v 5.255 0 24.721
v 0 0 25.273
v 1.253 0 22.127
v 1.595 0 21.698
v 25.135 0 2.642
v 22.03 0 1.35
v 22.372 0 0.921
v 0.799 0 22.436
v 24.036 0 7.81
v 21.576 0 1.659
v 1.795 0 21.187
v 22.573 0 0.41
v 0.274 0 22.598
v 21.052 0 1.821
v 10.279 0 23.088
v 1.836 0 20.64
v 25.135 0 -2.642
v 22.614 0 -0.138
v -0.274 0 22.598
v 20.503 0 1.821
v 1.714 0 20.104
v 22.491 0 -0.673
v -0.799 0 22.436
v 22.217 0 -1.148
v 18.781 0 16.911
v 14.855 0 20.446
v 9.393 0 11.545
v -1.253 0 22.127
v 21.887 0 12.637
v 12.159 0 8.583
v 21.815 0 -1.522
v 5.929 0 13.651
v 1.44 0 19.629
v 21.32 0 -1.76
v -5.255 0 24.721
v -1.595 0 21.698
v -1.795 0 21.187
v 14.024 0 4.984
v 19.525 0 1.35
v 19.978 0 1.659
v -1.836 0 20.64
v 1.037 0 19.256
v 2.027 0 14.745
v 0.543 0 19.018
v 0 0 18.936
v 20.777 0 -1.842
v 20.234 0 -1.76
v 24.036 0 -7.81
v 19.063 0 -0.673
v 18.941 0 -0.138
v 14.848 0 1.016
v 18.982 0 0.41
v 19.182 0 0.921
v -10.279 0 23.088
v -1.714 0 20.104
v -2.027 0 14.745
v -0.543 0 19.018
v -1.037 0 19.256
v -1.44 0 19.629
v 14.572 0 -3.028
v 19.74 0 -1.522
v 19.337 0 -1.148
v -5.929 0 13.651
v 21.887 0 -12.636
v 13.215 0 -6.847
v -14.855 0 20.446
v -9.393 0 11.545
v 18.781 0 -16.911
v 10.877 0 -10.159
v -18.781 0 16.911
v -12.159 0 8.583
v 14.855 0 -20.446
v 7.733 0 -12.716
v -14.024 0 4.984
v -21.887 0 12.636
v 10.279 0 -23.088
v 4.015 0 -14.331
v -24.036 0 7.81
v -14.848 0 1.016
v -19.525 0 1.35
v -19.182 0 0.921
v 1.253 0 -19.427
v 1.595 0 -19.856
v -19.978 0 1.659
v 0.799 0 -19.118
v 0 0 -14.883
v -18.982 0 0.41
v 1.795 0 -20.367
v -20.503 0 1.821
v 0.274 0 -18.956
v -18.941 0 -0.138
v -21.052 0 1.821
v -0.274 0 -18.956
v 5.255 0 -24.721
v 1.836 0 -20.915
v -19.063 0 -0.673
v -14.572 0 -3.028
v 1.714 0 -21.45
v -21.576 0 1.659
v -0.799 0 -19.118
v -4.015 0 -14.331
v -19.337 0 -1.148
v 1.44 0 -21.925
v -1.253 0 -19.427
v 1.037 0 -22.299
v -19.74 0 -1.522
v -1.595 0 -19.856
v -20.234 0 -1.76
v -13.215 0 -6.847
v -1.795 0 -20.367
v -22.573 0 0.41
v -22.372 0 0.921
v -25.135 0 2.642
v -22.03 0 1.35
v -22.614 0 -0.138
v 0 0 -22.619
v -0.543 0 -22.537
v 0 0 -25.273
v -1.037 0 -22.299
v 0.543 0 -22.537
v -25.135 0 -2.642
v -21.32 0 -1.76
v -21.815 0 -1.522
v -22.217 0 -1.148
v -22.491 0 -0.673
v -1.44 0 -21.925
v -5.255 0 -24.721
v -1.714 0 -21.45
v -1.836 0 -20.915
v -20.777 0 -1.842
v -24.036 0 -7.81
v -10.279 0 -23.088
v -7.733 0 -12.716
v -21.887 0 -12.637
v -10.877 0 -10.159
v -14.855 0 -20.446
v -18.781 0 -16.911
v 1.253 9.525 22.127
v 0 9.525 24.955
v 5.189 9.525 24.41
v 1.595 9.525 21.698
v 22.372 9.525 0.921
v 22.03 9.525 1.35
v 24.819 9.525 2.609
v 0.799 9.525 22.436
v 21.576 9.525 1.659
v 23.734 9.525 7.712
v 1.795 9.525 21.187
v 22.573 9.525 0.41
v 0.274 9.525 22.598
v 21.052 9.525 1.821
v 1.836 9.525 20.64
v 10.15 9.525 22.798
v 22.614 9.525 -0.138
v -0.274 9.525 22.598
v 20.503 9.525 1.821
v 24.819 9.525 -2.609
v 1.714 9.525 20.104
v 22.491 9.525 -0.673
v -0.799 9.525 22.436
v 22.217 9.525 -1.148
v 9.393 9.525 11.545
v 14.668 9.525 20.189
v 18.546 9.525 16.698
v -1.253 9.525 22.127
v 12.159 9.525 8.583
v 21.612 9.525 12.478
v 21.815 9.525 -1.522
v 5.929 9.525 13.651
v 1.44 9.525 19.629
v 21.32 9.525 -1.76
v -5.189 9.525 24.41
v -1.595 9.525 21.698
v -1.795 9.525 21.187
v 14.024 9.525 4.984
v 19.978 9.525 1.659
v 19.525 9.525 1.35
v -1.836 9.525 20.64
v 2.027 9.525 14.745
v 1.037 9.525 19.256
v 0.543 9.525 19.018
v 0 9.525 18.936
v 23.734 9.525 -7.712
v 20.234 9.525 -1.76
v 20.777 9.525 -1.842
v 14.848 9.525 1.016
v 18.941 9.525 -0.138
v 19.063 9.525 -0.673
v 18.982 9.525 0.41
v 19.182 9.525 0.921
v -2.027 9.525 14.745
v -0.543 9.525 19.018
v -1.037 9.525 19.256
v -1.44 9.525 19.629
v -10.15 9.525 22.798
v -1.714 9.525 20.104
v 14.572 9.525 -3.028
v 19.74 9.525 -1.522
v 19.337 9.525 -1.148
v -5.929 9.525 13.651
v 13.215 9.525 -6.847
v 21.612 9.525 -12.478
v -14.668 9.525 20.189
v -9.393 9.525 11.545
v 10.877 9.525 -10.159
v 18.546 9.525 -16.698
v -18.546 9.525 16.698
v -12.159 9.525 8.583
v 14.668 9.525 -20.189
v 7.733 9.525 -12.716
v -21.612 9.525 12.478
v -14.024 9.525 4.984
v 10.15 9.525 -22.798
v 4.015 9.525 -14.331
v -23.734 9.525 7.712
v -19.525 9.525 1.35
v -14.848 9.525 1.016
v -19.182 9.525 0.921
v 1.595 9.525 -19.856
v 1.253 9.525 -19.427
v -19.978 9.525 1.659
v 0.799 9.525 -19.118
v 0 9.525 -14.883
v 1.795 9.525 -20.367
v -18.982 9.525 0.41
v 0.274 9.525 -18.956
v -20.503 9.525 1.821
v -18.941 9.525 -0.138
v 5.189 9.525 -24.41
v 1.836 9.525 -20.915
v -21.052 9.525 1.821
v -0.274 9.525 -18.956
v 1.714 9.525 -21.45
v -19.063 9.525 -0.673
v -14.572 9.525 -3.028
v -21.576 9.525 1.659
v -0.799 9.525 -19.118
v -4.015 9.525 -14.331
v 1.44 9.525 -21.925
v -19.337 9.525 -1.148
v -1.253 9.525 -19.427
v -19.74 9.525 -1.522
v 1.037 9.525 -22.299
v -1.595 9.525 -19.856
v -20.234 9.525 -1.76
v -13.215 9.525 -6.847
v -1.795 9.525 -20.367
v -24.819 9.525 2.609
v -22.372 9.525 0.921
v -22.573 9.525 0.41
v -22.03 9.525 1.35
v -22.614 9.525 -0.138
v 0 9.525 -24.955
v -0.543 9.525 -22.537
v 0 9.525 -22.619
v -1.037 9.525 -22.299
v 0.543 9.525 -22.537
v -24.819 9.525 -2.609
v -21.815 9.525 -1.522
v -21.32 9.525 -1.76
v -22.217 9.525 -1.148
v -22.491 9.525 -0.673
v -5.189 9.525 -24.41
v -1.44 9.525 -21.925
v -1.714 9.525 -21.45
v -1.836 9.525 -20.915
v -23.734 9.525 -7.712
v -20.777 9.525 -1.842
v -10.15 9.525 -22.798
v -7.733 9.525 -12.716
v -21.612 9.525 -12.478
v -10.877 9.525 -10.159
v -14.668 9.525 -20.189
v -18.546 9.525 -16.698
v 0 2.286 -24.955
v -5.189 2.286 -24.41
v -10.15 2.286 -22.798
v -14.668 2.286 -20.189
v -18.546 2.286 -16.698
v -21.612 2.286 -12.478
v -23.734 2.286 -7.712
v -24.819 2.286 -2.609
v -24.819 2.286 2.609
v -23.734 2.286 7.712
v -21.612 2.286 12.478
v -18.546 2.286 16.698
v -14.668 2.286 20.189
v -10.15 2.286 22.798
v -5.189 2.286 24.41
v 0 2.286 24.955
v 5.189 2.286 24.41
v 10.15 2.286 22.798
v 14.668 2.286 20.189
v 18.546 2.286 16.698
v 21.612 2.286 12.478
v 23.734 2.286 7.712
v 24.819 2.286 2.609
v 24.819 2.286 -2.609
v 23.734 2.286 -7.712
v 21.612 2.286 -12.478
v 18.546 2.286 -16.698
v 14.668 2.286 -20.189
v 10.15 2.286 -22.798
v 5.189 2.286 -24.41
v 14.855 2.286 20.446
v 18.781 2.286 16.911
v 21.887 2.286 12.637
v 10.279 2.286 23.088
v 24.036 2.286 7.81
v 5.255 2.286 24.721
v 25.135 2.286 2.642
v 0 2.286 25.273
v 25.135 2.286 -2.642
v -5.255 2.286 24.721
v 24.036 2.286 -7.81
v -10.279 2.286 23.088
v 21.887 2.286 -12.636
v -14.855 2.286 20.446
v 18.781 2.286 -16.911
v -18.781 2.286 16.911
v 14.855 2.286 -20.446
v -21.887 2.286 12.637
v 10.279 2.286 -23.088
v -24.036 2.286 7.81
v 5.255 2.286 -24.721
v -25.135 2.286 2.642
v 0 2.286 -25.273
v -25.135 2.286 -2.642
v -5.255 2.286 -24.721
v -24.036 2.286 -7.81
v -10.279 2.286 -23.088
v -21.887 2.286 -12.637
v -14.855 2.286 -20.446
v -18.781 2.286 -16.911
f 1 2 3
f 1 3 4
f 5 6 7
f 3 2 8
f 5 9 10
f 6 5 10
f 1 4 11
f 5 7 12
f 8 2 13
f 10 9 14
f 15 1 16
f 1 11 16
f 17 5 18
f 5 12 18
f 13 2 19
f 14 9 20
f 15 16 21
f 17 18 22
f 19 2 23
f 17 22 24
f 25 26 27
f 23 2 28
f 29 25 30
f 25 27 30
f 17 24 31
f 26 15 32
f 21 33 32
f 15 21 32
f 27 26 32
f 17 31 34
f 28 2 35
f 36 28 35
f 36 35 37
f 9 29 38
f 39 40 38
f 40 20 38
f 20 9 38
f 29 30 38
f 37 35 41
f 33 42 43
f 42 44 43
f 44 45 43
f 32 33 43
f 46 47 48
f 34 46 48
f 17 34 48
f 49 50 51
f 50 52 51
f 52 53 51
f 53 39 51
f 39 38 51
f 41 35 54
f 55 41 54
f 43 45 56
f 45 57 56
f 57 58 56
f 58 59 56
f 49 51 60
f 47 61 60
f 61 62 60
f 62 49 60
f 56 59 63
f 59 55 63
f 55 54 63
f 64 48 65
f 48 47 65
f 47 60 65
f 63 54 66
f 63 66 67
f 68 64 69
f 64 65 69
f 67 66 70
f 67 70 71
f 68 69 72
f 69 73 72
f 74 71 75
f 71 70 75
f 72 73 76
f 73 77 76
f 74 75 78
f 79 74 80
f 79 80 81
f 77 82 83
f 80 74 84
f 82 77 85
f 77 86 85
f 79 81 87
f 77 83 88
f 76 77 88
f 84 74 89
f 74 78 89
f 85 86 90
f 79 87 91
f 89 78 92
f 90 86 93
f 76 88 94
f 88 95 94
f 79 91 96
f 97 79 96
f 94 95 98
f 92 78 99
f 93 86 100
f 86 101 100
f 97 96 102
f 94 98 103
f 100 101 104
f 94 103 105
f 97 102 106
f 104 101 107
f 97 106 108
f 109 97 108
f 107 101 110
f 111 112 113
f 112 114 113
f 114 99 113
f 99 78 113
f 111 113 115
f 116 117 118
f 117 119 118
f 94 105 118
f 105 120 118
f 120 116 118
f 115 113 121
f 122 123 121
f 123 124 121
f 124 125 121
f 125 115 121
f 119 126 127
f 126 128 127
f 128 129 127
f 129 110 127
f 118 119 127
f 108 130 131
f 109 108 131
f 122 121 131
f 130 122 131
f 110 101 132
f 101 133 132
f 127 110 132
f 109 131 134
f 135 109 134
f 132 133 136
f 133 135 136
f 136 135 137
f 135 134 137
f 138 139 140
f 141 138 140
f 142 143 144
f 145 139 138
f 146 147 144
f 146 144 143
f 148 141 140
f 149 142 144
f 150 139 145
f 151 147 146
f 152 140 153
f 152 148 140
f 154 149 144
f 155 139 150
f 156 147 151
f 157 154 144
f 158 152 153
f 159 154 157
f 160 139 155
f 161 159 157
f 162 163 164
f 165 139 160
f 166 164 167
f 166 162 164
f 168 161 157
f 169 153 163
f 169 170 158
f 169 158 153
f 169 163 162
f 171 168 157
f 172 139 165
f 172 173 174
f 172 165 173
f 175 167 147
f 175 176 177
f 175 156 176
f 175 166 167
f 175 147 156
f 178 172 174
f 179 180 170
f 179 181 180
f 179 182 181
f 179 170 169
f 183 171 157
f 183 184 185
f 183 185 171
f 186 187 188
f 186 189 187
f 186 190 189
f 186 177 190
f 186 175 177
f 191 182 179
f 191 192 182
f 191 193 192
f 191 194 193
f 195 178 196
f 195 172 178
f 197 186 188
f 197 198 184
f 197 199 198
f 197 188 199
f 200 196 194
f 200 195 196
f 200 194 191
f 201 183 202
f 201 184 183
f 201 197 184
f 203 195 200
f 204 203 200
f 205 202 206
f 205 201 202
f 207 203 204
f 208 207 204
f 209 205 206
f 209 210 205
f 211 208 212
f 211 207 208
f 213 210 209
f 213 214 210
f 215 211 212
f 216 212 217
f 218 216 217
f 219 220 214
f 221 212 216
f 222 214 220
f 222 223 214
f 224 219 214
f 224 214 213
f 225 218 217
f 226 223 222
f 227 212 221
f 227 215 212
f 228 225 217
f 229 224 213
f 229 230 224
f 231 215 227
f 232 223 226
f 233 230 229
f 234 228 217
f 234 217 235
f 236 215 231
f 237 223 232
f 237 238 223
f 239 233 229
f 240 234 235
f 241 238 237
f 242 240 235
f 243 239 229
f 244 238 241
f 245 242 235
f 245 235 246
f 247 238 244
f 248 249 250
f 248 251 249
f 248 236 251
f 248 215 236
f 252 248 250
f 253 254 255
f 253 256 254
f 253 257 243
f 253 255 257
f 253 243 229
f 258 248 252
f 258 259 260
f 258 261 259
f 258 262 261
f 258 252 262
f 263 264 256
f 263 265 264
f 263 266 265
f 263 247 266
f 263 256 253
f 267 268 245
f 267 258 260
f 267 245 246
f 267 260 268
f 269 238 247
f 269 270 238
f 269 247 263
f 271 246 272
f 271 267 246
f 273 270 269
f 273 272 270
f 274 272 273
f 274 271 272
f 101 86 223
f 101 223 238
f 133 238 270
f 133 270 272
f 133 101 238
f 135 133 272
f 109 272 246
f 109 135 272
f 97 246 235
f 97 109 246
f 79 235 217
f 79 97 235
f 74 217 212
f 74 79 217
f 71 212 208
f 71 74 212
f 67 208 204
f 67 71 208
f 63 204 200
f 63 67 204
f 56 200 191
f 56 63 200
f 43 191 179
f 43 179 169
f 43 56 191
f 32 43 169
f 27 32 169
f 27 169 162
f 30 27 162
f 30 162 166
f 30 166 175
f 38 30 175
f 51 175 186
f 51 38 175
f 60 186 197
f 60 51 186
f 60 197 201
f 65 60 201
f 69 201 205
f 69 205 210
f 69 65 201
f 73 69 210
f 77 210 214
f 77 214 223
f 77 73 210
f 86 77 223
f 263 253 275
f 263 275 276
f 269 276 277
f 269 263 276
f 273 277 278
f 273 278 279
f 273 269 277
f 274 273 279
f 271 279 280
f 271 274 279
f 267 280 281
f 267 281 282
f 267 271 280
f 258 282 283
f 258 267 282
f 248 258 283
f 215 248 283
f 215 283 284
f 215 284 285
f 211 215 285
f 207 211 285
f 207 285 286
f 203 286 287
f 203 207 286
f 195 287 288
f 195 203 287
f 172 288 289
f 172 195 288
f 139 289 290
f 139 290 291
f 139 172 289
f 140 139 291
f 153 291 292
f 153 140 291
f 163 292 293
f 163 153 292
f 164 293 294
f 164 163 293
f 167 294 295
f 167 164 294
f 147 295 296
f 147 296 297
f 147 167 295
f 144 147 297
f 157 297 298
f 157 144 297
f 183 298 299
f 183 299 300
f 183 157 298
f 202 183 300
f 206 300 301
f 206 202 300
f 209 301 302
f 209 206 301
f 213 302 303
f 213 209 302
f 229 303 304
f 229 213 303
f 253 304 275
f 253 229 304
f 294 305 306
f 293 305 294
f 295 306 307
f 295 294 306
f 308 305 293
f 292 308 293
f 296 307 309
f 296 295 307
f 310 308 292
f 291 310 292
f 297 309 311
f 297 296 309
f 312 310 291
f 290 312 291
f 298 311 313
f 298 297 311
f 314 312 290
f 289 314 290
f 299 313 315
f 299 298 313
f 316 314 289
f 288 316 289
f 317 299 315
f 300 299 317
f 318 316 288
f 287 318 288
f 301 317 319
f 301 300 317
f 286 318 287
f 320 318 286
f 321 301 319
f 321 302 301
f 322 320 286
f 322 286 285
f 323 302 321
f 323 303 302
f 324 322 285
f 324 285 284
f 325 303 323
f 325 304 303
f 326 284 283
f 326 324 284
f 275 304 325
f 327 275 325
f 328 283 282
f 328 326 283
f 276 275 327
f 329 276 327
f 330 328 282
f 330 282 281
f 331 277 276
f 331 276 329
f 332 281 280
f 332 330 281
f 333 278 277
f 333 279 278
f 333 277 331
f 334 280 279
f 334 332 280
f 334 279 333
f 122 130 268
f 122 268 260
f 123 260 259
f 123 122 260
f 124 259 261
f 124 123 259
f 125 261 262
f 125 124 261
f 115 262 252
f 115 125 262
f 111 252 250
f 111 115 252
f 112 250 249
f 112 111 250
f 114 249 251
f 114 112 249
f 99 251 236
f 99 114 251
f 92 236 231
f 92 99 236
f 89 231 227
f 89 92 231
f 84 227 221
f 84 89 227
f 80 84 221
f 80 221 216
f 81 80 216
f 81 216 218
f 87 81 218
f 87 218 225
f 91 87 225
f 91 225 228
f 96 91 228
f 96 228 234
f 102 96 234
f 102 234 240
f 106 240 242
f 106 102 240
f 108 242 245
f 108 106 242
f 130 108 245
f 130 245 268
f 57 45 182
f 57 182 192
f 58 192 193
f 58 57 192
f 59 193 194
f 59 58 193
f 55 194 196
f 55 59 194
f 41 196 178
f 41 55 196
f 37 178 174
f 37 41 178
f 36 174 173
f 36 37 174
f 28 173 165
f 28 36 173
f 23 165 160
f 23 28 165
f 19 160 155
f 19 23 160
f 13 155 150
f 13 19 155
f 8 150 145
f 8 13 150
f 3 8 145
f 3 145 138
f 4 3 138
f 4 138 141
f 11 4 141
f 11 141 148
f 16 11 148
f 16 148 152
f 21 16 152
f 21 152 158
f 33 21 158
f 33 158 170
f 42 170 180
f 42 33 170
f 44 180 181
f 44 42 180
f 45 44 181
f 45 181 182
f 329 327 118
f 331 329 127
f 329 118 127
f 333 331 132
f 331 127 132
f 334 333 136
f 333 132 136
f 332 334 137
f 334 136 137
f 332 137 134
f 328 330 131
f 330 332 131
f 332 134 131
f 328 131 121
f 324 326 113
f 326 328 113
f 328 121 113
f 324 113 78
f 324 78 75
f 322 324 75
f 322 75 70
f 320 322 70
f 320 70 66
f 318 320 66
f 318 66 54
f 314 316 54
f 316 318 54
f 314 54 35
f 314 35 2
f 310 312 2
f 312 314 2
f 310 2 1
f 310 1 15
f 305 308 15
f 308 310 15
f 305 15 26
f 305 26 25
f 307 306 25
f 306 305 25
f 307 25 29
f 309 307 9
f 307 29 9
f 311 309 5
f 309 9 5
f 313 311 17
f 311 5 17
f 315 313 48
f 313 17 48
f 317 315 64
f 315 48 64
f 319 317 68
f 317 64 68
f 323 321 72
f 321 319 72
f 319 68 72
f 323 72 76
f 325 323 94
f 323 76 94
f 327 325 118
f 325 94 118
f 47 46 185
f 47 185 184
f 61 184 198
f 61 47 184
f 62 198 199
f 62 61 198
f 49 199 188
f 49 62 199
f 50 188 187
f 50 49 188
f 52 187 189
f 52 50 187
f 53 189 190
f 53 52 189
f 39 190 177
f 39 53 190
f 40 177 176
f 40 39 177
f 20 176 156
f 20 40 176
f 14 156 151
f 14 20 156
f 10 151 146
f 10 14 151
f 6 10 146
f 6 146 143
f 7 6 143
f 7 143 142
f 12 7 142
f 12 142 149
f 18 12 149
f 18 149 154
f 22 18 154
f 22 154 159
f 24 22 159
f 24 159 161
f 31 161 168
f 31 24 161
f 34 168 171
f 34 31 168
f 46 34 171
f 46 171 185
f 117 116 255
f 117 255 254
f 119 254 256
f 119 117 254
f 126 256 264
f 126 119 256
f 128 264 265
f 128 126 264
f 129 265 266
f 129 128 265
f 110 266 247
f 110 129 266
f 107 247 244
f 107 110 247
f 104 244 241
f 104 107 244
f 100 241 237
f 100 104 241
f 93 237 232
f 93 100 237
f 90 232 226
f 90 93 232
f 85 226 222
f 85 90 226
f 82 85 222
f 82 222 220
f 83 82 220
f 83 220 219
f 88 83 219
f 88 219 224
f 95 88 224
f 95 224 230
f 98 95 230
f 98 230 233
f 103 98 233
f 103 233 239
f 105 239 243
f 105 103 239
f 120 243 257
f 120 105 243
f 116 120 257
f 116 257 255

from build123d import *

# Parameters (mm, degrees)
SKETCH1_R      = 25.273
SKETCH1_R_2    = 14.88313
SKETCH1_R_3    = 1.8415
EXTRUDE1_DEPTH = 9.525
SKETCH2_W      = 5.0939162
SKETCH2_H      = 11.293845459


with BuildPart() as part:
    # Sketch1 → Extrude1 (new body)
    with BuildSketch(Plane(origin=(0, 0, 0), x_dir=(1, 0, 0), z_dir=(0, 1, 0))):
        with Locations(Location((0, 0, 0), (0, 0, 90))):
            Circle(SKETCH1_R)
        with Locations(Location((0, 0, 0), (0, 0, 90))):
            Circle(SKETCH1_R_2, mode=Mode.SUBTRACT)
        with Locations(Location((0, 20.7772, 0), (0, 0, 90))):
            Circle(SKETCH1_R_3, mode=Mode.SUBTRACT)
        with Locations(Location((0, -20.7772, 0), (0, 0, 90))):
            Circle(SKETCH1_R_3, mode=Mode.SUBTRACT)
        with Locations(Location((20.7772, 0, 0), (0, 0, 90))):
            Circle(SKETCH1_R_3, mode=Mode.SUBTRACT)
        with Locations(Location((-20.7772, 0, 0), (0, 0, 90))):
            Circle(SKETCH1_R_3, mode=Mode.SUBTRACT)
    extrude(amount=EXTRUDE1_DEPTH)

    # Sketch2 → Cut-Revolve1 (revolve, cut)
    with BuildSketch(Plane(origin=(0, 0, 0), x_dir=(0, 0, -1), z_dir=(1, 0, 0)), mode=Mode.PRIVATE) as cut_revolve1_sk:
        with Locations((-27.5024581, 7.93292273)):
            Rectangle(SKETCH2_W, SKETCH2_H)
    revolve(cut_revolve1_sk.sketch.rotate(Axis((0, 0, 0), (0, 1, 0)), 180), axis=Axis((0, 0, 0), (0, 1, 0)), mode=Mode.SUBTRACT)


solid = part.part
